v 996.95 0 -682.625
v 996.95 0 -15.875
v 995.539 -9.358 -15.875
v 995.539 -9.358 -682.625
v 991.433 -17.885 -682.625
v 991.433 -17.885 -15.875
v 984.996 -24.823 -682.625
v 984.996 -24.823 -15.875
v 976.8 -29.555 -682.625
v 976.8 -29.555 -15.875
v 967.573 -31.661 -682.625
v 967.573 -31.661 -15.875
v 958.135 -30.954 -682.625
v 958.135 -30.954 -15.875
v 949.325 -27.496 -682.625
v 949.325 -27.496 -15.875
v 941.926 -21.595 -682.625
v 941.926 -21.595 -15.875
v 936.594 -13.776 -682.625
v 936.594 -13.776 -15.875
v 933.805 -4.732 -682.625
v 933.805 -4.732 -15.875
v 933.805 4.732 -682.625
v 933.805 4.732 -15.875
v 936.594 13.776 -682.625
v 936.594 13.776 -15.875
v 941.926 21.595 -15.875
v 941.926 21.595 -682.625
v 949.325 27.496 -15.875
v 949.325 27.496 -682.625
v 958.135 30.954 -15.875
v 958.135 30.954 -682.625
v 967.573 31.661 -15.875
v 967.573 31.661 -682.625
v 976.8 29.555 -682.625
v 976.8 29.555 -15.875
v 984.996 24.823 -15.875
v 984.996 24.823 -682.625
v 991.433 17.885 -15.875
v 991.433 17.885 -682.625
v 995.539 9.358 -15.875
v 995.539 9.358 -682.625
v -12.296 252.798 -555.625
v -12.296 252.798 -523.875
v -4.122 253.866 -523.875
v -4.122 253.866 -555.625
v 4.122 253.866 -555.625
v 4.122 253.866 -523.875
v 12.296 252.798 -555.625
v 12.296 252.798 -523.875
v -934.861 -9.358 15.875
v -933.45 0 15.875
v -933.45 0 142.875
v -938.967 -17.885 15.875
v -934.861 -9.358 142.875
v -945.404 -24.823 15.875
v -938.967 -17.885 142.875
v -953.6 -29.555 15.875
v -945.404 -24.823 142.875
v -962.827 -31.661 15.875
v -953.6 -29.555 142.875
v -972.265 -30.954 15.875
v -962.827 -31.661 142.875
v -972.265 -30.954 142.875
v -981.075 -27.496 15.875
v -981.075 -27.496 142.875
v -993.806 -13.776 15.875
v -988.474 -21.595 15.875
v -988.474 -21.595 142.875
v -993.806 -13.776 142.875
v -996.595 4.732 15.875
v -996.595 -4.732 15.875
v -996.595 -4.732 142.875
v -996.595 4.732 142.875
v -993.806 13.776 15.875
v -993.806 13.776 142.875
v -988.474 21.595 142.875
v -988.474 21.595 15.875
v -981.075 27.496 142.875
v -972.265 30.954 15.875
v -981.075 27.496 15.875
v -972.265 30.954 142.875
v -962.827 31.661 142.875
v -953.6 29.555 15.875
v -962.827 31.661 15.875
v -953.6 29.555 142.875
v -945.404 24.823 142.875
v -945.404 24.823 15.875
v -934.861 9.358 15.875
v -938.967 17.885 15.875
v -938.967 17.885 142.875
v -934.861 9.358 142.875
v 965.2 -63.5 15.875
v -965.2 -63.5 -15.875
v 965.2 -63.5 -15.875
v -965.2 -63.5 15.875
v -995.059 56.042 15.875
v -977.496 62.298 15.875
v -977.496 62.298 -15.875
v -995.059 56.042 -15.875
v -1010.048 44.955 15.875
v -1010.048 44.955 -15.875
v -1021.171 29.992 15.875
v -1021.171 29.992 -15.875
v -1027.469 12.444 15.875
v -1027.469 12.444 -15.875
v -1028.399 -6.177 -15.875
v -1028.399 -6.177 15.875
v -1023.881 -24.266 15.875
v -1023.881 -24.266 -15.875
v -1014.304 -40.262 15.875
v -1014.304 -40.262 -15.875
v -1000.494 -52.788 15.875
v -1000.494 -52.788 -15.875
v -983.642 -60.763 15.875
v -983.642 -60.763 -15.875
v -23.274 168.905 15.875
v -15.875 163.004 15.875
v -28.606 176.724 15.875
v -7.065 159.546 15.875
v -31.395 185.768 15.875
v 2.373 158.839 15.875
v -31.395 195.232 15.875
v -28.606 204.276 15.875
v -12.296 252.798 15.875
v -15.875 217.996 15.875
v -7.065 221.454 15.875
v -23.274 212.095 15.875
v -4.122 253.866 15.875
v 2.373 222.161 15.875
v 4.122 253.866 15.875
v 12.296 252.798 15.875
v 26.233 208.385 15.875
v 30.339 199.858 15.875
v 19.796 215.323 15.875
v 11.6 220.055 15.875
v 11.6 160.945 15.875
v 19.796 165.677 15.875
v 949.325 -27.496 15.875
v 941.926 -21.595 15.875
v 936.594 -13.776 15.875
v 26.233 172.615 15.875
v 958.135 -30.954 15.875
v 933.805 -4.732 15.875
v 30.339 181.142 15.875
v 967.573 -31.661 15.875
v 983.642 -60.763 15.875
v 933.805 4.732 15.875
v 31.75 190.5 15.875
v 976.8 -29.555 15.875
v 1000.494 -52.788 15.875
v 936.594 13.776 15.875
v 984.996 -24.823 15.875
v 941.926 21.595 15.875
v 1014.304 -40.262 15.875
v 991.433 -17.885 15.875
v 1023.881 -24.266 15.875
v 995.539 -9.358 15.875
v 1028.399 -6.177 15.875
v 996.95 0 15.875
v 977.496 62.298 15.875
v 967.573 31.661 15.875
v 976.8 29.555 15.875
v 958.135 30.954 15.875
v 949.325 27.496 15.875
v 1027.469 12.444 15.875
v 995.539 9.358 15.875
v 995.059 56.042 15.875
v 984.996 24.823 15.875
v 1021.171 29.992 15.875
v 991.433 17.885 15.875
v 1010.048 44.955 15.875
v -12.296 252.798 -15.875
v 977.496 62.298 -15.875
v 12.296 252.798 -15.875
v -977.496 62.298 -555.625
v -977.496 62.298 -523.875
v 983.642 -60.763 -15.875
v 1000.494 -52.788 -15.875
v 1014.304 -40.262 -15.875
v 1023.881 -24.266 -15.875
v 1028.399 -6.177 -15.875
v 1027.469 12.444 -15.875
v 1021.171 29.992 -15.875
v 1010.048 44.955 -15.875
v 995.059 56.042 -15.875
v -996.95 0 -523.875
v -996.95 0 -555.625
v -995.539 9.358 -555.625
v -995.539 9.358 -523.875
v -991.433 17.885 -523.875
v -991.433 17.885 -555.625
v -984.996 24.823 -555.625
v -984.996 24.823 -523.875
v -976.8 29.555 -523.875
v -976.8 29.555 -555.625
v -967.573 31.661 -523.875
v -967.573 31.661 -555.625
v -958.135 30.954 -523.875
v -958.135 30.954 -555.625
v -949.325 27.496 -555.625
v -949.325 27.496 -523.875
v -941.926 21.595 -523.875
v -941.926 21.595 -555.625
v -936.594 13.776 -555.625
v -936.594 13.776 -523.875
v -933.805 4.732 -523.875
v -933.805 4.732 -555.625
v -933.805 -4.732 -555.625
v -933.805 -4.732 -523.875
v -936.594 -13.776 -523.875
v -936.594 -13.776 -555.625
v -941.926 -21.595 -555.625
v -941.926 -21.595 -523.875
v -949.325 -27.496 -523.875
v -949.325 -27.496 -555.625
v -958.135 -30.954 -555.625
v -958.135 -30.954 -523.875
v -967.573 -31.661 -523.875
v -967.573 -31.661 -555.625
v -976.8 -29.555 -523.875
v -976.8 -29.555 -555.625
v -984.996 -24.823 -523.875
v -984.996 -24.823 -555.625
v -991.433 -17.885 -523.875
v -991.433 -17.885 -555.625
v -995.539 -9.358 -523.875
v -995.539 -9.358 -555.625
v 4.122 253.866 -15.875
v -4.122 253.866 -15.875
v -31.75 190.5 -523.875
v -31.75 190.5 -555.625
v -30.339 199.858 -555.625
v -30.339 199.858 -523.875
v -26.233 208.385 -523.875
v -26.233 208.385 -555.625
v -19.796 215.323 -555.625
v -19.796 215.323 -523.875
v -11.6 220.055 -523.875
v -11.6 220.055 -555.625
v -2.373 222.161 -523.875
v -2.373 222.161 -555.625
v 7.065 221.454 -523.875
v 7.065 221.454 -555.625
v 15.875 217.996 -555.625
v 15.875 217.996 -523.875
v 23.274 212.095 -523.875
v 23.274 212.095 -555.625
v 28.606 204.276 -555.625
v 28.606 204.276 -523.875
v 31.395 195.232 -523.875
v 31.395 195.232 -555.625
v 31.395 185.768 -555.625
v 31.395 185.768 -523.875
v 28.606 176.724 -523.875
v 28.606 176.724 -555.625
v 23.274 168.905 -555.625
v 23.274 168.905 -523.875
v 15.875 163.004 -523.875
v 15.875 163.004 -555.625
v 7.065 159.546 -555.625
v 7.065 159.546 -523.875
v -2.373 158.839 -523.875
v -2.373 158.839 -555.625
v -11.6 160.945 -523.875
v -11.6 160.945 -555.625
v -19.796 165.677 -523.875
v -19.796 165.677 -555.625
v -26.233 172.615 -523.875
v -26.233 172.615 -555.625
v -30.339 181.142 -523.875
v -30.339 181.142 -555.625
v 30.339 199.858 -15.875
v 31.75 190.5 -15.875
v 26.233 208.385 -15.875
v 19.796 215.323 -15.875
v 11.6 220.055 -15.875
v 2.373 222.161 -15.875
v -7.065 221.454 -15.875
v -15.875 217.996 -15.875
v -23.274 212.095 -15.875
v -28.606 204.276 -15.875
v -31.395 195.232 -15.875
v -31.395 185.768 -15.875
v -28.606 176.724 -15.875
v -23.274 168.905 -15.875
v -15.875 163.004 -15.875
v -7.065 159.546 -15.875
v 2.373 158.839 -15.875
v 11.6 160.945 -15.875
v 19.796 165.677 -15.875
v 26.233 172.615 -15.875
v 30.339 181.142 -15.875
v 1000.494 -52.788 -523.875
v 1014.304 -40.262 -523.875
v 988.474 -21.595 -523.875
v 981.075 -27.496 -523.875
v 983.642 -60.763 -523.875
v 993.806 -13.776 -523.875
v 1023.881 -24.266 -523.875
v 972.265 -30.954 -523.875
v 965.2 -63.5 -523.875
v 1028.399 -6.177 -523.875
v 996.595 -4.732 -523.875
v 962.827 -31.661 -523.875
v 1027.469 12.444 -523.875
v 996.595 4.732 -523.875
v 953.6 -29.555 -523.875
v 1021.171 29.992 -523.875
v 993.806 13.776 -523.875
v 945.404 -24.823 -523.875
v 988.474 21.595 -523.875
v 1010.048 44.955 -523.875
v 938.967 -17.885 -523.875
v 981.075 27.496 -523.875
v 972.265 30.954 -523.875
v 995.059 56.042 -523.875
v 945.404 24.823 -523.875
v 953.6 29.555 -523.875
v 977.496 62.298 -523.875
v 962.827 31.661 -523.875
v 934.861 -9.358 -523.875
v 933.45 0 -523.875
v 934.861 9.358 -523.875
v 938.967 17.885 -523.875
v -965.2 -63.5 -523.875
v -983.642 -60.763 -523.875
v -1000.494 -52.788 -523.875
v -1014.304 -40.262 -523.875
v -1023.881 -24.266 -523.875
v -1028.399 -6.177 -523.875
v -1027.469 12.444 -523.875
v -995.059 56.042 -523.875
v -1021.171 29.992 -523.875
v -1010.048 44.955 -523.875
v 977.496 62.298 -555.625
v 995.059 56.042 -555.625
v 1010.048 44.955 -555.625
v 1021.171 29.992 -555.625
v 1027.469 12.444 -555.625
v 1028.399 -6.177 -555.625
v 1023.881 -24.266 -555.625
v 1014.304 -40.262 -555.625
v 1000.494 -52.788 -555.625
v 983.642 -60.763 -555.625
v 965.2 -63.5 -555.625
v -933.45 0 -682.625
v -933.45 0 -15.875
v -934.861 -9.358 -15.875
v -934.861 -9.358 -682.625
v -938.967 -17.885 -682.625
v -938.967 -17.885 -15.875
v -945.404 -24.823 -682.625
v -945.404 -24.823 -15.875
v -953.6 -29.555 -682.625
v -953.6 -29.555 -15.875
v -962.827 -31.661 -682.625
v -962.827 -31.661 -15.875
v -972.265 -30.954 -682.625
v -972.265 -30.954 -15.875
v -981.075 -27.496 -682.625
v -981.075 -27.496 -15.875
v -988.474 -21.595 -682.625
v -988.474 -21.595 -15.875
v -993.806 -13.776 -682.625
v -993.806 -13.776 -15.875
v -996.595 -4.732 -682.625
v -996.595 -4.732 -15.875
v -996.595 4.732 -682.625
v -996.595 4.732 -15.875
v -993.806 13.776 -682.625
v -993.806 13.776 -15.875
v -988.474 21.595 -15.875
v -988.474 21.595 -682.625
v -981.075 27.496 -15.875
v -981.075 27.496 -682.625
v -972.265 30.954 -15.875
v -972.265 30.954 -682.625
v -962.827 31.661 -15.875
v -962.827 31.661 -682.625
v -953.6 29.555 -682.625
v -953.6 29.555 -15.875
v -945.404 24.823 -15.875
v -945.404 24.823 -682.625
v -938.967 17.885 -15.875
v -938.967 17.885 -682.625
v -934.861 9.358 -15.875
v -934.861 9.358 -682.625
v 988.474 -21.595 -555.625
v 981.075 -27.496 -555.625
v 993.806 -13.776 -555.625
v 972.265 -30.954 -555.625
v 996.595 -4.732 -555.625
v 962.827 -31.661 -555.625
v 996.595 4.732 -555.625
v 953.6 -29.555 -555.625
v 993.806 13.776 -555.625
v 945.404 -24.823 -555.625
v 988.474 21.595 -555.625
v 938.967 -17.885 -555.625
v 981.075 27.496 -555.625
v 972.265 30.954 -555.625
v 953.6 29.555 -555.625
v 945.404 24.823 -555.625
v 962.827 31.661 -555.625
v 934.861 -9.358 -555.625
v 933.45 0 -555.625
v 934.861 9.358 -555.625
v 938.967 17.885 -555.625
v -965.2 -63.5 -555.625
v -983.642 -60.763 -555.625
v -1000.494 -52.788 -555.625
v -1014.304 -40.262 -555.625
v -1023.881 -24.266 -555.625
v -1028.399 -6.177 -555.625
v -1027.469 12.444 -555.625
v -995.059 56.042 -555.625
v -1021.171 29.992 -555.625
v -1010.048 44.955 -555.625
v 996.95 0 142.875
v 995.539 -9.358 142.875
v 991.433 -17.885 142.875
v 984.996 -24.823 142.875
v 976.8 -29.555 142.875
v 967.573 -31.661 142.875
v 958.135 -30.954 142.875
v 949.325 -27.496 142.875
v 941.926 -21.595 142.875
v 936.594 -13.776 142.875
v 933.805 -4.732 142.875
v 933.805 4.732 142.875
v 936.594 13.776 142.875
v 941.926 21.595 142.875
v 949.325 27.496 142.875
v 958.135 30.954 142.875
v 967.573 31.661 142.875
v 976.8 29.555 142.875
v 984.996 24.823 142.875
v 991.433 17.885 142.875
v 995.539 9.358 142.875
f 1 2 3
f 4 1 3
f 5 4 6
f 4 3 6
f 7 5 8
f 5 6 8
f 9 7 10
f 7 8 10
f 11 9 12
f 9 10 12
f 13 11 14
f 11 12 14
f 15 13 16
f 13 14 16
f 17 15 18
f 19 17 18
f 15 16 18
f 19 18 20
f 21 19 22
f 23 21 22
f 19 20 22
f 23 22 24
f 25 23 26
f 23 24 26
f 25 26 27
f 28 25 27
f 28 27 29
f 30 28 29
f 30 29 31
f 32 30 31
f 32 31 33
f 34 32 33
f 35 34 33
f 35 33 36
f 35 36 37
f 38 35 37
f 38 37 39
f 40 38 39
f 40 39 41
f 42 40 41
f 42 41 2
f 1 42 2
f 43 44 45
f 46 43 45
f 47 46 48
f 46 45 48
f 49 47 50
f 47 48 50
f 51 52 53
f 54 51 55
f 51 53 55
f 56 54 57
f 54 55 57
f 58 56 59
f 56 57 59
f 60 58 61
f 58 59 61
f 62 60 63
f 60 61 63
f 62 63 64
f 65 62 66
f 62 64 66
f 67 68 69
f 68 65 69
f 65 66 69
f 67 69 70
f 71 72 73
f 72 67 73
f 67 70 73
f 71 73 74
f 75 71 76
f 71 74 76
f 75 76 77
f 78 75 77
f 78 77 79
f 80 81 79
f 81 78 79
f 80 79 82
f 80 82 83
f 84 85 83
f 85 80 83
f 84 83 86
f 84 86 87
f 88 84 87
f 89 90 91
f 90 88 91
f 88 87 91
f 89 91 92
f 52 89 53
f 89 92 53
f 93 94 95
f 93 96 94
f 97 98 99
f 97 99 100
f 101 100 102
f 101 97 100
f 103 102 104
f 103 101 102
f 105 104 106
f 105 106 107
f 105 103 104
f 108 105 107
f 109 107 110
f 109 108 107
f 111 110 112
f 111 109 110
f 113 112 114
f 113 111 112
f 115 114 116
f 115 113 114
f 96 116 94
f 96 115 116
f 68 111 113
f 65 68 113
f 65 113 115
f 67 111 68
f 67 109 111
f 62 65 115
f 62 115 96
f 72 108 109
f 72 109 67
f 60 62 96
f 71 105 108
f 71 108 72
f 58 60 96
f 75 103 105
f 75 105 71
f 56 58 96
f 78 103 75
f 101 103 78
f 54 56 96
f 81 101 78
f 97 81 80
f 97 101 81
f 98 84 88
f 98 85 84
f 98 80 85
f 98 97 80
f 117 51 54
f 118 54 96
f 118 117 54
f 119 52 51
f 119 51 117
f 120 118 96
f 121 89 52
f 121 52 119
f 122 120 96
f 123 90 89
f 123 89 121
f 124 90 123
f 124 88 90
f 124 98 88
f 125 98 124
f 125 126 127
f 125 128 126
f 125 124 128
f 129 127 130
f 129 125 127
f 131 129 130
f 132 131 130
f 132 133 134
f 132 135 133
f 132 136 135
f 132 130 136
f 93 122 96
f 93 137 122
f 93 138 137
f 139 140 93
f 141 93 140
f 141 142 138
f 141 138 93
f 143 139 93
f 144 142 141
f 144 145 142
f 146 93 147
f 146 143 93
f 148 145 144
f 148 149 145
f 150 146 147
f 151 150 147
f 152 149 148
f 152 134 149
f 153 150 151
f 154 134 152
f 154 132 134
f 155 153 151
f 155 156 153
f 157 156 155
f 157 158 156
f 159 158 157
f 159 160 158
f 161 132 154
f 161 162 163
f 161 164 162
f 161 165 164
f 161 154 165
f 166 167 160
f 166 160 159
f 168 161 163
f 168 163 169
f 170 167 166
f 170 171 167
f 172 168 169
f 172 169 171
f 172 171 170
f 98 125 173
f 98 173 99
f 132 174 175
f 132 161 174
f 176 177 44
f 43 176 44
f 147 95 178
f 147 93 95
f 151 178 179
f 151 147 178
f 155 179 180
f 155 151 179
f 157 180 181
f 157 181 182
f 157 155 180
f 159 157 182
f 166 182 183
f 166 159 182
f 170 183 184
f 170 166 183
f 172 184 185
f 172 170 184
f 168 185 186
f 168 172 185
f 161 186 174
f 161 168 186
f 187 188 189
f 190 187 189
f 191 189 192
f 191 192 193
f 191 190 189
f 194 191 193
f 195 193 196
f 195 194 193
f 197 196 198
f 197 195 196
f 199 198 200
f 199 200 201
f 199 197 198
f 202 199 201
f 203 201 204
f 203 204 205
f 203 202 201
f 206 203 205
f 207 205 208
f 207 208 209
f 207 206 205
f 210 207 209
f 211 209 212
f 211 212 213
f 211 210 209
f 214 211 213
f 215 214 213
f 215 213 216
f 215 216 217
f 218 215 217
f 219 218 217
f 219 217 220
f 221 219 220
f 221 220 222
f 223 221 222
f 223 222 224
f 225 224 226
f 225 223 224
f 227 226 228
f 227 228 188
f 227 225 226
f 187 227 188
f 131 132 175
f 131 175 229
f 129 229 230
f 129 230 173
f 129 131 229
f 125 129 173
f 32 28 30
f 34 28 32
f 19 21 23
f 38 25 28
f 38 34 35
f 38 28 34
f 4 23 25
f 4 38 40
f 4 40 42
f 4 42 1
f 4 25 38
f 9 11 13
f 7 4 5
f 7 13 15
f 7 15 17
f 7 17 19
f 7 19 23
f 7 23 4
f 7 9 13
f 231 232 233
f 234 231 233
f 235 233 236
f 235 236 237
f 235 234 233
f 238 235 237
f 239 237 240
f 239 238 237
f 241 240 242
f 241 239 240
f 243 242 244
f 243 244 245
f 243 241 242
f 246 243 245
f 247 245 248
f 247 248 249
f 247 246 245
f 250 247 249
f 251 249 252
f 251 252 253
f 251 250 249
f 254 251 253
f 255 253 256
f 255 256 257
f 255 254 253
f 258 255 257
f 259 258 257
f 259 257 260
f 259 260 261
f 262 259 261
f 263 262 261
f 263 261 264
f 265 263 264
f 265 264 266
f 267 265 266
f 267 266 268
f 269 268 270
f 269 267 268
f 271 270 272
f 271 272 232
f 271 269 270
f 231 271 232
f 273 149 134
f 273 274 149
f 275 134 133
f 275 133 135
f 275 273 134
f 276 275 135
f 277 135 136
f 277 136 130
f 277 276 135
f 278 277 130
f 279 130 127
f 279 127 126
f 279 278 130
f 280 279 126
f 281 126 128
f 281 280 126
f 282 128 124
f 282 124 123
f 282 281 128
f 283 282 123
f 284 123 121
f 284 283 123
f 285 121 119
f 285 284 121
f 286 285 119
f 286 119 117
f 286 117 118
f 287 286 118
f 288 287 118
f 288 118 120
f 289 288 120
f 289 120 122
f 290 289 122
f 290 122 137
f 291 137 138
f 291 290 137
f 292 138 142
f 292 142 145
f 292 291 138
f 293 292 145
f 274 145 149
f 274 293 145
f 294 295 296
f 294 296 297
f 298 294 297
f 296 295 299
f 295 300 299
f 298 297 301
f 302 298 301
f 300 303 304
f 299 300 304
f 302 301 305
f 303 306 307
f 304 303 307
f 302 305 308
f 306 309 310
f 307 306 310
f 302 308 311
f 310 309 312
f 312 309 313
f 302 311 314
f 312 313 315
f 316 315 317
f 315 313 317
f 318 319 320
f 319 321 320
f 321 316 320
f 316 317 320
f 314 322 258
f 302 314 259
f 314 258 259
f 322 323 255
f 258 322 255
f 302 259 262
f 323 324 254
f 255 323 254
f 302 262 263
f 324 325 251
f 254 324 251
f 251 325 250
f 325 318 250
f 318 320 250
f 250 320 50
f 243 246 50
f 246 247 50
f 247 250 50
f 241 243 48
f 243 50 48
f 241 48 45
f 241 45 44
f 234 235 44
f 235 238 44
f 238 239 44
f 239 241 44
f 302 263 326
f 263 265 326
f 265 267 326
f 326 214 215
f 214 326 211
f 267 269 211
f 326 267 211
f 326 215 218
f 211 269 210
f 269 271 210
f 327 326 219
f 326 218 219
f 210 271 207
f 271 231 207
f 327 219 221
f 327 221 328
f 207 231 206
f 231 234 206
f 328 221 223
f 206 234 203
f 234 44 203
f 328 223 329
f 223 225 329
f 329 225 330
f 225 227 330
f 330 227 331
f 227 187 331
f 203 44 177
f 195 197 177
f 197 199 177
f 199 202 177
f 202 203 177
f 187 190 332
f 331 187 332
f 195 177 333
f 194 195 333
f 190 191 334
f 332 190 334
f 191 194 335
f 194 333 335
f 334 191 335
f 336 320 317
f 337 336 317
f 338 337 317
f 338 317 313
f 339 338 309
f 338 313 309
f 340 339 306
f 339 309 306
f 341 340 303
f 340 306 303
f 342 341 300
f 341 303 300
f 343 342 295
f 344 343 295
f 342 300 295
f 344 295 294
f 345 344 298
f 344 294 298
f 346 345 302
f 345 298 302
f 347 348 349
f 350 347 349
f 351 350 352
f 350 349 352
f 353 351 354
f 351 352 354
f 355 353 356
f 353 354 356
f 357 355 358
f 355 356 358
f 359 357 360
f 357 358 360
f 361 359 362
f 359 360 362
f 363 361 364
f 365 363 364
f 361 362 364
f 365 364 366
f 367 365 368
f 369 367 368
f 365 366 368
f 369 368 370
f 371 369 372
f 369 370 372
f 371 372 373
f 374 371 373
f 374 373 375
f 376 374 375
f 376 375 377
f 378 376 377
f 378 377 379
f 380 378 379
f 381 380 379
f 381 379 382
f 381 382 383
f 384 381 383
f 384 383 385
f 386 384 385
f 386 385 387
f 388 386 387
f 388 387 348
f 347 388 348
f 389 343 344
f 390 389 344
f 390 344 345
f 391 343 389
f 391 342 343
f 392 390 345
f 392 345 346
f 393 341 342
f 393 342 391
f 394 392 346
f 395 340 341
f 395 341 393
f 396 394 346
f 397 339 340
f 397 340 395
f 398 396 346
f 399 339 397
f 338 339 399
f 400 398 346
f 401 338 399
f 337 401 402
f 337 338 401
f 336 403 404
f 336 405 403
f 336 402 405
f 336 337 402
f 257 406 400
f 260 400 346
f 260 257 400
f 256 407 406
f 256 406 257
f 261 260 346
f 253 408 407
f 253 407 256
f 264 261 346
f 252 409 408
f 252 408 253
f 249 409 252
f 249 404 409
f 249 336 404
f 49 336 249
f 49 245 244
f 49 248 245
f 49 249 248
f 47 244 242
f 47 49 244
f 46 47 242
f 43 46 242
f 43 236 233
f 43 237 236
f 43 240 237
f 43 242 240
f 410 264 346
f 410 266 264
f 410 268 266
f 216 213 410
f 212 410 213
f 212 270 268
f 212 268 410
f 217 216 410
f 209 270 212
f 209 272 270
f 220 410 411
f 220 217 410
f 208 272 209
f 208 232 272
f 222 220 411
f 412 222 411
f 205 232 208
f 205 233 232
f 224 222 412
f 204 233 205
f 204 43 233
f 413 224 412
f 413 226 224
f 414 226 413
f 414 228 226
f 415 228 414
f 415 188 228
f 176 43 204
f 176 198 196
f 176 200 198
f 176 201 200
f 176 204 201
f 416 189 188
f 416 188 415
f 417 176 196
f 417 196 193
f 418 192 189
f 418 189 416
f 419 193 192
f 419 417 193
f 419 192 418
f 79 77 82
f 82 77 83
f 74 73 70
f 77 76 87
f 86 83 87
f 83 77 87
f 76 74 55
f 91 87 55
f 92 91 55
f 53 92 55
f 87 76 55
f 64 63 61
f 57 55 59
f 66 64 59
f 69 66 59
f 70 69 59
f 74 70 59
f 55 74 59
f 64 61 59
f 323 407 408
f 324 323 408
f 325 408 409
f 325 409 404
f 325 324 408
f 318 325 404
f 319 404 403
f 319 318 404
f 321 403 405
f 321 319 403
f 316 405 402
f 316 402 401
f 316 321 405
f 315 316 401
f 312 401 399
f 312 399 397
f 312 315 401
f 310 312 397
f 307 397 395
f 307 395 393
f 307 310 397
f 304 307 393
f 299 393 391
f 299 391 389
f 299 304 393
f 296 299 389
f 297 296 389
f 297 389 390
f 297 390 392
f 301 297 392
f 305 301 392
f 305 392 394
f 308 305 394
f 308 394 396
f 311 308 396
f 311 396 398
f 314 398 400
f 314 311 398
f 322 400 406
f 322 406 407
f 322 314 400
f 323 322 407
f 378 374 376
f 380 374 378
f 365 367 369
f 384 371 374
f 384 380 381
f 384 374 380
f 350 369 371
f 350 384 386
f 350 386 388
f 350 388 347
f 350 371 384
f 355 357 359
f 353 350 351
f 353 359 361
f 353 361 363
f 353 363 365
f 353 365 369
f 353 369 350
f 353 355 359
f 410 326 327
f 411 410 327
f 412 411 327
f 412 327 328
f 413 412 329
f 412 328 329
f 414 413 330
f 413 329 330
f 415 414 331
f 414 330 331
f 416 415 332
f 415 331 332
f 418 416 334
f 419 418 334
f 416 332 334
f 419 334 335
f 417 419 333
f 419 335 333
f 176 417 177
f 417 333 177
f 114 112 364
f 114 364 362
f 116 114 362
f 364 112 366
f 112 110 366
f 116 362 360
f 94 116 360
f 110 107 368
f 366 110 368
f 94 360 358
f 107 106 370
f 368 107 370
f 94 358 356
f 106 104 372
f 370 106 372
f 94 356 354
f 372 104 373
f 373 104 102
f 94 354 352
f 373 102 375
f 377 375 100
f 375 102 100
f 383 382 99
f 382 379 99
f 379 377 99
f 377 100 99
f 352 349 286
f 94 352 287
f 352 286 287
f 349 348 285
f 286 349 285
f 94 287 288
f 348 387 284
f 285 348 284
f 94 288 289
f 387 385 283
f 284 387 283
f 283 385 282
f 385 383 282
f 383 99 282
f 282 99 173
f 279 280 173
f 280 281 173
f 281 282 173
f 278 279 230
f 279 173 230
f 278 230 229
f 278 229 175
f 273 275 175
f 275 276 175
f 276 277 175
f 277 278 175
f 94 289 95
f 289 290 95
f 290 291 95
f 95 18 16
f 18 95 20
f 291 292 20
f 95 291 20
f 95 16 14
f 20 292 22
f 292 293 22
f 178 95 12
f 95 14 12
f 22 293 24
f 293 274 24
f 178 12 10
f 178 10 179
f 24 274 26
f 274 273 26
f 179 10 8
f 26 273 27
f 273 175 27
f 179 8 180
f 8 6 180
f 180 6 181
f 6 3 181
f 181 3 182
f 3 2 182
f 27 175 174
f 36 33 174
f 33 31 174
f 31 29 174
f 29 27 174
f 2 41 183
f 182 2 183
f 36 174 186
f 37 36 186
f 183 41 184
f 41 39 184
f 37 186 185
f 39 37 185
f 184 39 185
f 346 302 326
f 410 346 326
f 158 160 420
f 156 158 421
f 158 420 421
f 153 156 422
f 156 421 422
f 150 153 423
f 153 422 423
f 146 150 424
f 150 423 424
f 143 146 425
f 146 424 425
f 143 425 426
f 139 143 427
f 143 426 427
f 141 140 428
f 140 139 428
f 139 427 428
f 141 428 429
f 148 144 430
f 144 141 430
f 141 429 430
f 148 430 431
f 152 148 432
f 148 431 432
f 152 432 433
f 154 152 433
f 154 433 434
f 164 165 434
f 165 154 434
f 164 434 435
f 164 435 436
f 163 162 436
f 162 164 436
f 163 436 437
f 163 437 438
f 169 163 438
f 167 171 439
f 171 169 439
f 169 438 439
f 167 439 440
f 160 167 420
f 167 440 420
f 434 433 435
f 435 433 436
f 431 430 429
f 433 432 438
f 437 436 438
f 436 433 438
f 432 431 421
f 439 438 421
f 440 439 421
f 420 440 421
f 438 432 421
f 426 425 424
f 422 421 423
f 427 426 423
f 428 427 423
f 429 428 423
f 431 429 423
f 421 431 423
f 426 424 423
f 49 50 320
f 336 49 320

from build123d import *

# Parameters (mm, degrees)
SKETCH1_R                = 31.75
BOSS_EXTRUDE1_DEPTH      = 15.875
BOSS_EXTRUDE3_DEPTH      = 666.75
BOSS_EXTRUDE3_DEPTH_BACK = 158.75
SKETCH4_R                = 31.75
SKETCH5_R                = 31.75
BOSS_EXTRUDE4_DEPTH      = 31.75


with BuildPart() as part:
    # Sketch1 → Boss-Extrude1 (new, symmetric)
    with BuildSketch(Plane.XY):
        with BuildLine():
            Line((977.495697525, 62.298200796), (12.295697525, 252.798200796))
            ThreePointArc((12.295697525, 252.798200796), (0, 254), (-12.295697525, 252.798200796))
            Line((-12.295697525, 252.798200796), (-977.495697525, 62.298200796))
            ThreePointArc((-977.495697525, 62.298200796), (-1028.398836028, -6.177145355), (-965.2, -63.5))
            Line((-965.2, -63.5), (965.2, -63.5))
            ThreePointArc((965.2, -63.5), (1028.398836028, -6.177145355), (977.495697525, 62.298200796))
        make_face()
        with Locations((0, 190.5)):
            Circle(SKETCH1_R, mode=Mode.SUBTRACT)
        with Locations((-965.2, 0)):
            Circle(SKETCH1_R, mode=Mode.SUBTRACT)
        with Locations(Location((965.2, 0, 0), (0, 0, 180))):
            Circle(SKETCH1_R, mode=Mode.SUBTRACT)
    extrude(amount=BOSS_EXTRUDE1_DEPTH, both=True)

    # Sketch4 → Boss-Extrude3 (add, two sides: drawn at the far end of the back side and taken through both)
    with BuildSketch(Plane(origin=(0, 0, -15.875), x_dir=(-1, 0, 0), z_dir=(0, 0, -1)).offset(-BOSS_EXTRUDE3_DEPTH_BACK)):
        with Locations(Location((-965.2, 0, 0), (0, 0, 180))):
            Circle(SKETCH4_R)
        with Locations(Location((965.2, 0, 0), (0, 0, 180))):
            Circle(SKETCH4_R)
    extrude(amount=BOSS_EXTRUDE3_DEPTH + BOSS_EXTRUDE3_DEPTH_BACK)


with BuildPart() as body_2:
    # Sketch5 → Boss-Extrude4 (new body)
    with BuildSketch(Plane(origin=(0, 0, -523.875), x_dir=(-1, 0, 0), z_dir=(0, 0, -1))):
        with BuildLine():
            Line((977.495697525, 62.298200796), (12.295697525, 252.798200796))
            ThreePointArc((12.295697525, 252.798200796), (0, 254), (-12.295697525, 252.798200796))
            Line((-12.295697525, 252.798200796), (-977.495697525, 62.298200796))
            ThreePointArc((-977.495697525, 62.298200796), (-1028.398836028, -6.177145355), (-965.2, -63.5))
            Line((-965.2, -63.5), (965.2, -63.5))
            ThreePointArc((965.2, -63.5), (1028.398836028, -6.177145355), (977.495697525, 62.298200796))
        make_face()
        with Locations((0, 190.5)):
            Circle(SKETCH5_R, mode=Mode.SUBTRACT)
        with Locations((965.2, 0)):
            Circle(SKETCH5_R, mode=Mode.SUBTRACT)
        with Locations((-965.2, 0)):
            Circle(SKETCH5_R, mode=Mode.SUBTRACT)
    extrude(amount=BOSS_EXTRUDE4_DEPTH)


solid = Compound([part.part, body_2.part])
